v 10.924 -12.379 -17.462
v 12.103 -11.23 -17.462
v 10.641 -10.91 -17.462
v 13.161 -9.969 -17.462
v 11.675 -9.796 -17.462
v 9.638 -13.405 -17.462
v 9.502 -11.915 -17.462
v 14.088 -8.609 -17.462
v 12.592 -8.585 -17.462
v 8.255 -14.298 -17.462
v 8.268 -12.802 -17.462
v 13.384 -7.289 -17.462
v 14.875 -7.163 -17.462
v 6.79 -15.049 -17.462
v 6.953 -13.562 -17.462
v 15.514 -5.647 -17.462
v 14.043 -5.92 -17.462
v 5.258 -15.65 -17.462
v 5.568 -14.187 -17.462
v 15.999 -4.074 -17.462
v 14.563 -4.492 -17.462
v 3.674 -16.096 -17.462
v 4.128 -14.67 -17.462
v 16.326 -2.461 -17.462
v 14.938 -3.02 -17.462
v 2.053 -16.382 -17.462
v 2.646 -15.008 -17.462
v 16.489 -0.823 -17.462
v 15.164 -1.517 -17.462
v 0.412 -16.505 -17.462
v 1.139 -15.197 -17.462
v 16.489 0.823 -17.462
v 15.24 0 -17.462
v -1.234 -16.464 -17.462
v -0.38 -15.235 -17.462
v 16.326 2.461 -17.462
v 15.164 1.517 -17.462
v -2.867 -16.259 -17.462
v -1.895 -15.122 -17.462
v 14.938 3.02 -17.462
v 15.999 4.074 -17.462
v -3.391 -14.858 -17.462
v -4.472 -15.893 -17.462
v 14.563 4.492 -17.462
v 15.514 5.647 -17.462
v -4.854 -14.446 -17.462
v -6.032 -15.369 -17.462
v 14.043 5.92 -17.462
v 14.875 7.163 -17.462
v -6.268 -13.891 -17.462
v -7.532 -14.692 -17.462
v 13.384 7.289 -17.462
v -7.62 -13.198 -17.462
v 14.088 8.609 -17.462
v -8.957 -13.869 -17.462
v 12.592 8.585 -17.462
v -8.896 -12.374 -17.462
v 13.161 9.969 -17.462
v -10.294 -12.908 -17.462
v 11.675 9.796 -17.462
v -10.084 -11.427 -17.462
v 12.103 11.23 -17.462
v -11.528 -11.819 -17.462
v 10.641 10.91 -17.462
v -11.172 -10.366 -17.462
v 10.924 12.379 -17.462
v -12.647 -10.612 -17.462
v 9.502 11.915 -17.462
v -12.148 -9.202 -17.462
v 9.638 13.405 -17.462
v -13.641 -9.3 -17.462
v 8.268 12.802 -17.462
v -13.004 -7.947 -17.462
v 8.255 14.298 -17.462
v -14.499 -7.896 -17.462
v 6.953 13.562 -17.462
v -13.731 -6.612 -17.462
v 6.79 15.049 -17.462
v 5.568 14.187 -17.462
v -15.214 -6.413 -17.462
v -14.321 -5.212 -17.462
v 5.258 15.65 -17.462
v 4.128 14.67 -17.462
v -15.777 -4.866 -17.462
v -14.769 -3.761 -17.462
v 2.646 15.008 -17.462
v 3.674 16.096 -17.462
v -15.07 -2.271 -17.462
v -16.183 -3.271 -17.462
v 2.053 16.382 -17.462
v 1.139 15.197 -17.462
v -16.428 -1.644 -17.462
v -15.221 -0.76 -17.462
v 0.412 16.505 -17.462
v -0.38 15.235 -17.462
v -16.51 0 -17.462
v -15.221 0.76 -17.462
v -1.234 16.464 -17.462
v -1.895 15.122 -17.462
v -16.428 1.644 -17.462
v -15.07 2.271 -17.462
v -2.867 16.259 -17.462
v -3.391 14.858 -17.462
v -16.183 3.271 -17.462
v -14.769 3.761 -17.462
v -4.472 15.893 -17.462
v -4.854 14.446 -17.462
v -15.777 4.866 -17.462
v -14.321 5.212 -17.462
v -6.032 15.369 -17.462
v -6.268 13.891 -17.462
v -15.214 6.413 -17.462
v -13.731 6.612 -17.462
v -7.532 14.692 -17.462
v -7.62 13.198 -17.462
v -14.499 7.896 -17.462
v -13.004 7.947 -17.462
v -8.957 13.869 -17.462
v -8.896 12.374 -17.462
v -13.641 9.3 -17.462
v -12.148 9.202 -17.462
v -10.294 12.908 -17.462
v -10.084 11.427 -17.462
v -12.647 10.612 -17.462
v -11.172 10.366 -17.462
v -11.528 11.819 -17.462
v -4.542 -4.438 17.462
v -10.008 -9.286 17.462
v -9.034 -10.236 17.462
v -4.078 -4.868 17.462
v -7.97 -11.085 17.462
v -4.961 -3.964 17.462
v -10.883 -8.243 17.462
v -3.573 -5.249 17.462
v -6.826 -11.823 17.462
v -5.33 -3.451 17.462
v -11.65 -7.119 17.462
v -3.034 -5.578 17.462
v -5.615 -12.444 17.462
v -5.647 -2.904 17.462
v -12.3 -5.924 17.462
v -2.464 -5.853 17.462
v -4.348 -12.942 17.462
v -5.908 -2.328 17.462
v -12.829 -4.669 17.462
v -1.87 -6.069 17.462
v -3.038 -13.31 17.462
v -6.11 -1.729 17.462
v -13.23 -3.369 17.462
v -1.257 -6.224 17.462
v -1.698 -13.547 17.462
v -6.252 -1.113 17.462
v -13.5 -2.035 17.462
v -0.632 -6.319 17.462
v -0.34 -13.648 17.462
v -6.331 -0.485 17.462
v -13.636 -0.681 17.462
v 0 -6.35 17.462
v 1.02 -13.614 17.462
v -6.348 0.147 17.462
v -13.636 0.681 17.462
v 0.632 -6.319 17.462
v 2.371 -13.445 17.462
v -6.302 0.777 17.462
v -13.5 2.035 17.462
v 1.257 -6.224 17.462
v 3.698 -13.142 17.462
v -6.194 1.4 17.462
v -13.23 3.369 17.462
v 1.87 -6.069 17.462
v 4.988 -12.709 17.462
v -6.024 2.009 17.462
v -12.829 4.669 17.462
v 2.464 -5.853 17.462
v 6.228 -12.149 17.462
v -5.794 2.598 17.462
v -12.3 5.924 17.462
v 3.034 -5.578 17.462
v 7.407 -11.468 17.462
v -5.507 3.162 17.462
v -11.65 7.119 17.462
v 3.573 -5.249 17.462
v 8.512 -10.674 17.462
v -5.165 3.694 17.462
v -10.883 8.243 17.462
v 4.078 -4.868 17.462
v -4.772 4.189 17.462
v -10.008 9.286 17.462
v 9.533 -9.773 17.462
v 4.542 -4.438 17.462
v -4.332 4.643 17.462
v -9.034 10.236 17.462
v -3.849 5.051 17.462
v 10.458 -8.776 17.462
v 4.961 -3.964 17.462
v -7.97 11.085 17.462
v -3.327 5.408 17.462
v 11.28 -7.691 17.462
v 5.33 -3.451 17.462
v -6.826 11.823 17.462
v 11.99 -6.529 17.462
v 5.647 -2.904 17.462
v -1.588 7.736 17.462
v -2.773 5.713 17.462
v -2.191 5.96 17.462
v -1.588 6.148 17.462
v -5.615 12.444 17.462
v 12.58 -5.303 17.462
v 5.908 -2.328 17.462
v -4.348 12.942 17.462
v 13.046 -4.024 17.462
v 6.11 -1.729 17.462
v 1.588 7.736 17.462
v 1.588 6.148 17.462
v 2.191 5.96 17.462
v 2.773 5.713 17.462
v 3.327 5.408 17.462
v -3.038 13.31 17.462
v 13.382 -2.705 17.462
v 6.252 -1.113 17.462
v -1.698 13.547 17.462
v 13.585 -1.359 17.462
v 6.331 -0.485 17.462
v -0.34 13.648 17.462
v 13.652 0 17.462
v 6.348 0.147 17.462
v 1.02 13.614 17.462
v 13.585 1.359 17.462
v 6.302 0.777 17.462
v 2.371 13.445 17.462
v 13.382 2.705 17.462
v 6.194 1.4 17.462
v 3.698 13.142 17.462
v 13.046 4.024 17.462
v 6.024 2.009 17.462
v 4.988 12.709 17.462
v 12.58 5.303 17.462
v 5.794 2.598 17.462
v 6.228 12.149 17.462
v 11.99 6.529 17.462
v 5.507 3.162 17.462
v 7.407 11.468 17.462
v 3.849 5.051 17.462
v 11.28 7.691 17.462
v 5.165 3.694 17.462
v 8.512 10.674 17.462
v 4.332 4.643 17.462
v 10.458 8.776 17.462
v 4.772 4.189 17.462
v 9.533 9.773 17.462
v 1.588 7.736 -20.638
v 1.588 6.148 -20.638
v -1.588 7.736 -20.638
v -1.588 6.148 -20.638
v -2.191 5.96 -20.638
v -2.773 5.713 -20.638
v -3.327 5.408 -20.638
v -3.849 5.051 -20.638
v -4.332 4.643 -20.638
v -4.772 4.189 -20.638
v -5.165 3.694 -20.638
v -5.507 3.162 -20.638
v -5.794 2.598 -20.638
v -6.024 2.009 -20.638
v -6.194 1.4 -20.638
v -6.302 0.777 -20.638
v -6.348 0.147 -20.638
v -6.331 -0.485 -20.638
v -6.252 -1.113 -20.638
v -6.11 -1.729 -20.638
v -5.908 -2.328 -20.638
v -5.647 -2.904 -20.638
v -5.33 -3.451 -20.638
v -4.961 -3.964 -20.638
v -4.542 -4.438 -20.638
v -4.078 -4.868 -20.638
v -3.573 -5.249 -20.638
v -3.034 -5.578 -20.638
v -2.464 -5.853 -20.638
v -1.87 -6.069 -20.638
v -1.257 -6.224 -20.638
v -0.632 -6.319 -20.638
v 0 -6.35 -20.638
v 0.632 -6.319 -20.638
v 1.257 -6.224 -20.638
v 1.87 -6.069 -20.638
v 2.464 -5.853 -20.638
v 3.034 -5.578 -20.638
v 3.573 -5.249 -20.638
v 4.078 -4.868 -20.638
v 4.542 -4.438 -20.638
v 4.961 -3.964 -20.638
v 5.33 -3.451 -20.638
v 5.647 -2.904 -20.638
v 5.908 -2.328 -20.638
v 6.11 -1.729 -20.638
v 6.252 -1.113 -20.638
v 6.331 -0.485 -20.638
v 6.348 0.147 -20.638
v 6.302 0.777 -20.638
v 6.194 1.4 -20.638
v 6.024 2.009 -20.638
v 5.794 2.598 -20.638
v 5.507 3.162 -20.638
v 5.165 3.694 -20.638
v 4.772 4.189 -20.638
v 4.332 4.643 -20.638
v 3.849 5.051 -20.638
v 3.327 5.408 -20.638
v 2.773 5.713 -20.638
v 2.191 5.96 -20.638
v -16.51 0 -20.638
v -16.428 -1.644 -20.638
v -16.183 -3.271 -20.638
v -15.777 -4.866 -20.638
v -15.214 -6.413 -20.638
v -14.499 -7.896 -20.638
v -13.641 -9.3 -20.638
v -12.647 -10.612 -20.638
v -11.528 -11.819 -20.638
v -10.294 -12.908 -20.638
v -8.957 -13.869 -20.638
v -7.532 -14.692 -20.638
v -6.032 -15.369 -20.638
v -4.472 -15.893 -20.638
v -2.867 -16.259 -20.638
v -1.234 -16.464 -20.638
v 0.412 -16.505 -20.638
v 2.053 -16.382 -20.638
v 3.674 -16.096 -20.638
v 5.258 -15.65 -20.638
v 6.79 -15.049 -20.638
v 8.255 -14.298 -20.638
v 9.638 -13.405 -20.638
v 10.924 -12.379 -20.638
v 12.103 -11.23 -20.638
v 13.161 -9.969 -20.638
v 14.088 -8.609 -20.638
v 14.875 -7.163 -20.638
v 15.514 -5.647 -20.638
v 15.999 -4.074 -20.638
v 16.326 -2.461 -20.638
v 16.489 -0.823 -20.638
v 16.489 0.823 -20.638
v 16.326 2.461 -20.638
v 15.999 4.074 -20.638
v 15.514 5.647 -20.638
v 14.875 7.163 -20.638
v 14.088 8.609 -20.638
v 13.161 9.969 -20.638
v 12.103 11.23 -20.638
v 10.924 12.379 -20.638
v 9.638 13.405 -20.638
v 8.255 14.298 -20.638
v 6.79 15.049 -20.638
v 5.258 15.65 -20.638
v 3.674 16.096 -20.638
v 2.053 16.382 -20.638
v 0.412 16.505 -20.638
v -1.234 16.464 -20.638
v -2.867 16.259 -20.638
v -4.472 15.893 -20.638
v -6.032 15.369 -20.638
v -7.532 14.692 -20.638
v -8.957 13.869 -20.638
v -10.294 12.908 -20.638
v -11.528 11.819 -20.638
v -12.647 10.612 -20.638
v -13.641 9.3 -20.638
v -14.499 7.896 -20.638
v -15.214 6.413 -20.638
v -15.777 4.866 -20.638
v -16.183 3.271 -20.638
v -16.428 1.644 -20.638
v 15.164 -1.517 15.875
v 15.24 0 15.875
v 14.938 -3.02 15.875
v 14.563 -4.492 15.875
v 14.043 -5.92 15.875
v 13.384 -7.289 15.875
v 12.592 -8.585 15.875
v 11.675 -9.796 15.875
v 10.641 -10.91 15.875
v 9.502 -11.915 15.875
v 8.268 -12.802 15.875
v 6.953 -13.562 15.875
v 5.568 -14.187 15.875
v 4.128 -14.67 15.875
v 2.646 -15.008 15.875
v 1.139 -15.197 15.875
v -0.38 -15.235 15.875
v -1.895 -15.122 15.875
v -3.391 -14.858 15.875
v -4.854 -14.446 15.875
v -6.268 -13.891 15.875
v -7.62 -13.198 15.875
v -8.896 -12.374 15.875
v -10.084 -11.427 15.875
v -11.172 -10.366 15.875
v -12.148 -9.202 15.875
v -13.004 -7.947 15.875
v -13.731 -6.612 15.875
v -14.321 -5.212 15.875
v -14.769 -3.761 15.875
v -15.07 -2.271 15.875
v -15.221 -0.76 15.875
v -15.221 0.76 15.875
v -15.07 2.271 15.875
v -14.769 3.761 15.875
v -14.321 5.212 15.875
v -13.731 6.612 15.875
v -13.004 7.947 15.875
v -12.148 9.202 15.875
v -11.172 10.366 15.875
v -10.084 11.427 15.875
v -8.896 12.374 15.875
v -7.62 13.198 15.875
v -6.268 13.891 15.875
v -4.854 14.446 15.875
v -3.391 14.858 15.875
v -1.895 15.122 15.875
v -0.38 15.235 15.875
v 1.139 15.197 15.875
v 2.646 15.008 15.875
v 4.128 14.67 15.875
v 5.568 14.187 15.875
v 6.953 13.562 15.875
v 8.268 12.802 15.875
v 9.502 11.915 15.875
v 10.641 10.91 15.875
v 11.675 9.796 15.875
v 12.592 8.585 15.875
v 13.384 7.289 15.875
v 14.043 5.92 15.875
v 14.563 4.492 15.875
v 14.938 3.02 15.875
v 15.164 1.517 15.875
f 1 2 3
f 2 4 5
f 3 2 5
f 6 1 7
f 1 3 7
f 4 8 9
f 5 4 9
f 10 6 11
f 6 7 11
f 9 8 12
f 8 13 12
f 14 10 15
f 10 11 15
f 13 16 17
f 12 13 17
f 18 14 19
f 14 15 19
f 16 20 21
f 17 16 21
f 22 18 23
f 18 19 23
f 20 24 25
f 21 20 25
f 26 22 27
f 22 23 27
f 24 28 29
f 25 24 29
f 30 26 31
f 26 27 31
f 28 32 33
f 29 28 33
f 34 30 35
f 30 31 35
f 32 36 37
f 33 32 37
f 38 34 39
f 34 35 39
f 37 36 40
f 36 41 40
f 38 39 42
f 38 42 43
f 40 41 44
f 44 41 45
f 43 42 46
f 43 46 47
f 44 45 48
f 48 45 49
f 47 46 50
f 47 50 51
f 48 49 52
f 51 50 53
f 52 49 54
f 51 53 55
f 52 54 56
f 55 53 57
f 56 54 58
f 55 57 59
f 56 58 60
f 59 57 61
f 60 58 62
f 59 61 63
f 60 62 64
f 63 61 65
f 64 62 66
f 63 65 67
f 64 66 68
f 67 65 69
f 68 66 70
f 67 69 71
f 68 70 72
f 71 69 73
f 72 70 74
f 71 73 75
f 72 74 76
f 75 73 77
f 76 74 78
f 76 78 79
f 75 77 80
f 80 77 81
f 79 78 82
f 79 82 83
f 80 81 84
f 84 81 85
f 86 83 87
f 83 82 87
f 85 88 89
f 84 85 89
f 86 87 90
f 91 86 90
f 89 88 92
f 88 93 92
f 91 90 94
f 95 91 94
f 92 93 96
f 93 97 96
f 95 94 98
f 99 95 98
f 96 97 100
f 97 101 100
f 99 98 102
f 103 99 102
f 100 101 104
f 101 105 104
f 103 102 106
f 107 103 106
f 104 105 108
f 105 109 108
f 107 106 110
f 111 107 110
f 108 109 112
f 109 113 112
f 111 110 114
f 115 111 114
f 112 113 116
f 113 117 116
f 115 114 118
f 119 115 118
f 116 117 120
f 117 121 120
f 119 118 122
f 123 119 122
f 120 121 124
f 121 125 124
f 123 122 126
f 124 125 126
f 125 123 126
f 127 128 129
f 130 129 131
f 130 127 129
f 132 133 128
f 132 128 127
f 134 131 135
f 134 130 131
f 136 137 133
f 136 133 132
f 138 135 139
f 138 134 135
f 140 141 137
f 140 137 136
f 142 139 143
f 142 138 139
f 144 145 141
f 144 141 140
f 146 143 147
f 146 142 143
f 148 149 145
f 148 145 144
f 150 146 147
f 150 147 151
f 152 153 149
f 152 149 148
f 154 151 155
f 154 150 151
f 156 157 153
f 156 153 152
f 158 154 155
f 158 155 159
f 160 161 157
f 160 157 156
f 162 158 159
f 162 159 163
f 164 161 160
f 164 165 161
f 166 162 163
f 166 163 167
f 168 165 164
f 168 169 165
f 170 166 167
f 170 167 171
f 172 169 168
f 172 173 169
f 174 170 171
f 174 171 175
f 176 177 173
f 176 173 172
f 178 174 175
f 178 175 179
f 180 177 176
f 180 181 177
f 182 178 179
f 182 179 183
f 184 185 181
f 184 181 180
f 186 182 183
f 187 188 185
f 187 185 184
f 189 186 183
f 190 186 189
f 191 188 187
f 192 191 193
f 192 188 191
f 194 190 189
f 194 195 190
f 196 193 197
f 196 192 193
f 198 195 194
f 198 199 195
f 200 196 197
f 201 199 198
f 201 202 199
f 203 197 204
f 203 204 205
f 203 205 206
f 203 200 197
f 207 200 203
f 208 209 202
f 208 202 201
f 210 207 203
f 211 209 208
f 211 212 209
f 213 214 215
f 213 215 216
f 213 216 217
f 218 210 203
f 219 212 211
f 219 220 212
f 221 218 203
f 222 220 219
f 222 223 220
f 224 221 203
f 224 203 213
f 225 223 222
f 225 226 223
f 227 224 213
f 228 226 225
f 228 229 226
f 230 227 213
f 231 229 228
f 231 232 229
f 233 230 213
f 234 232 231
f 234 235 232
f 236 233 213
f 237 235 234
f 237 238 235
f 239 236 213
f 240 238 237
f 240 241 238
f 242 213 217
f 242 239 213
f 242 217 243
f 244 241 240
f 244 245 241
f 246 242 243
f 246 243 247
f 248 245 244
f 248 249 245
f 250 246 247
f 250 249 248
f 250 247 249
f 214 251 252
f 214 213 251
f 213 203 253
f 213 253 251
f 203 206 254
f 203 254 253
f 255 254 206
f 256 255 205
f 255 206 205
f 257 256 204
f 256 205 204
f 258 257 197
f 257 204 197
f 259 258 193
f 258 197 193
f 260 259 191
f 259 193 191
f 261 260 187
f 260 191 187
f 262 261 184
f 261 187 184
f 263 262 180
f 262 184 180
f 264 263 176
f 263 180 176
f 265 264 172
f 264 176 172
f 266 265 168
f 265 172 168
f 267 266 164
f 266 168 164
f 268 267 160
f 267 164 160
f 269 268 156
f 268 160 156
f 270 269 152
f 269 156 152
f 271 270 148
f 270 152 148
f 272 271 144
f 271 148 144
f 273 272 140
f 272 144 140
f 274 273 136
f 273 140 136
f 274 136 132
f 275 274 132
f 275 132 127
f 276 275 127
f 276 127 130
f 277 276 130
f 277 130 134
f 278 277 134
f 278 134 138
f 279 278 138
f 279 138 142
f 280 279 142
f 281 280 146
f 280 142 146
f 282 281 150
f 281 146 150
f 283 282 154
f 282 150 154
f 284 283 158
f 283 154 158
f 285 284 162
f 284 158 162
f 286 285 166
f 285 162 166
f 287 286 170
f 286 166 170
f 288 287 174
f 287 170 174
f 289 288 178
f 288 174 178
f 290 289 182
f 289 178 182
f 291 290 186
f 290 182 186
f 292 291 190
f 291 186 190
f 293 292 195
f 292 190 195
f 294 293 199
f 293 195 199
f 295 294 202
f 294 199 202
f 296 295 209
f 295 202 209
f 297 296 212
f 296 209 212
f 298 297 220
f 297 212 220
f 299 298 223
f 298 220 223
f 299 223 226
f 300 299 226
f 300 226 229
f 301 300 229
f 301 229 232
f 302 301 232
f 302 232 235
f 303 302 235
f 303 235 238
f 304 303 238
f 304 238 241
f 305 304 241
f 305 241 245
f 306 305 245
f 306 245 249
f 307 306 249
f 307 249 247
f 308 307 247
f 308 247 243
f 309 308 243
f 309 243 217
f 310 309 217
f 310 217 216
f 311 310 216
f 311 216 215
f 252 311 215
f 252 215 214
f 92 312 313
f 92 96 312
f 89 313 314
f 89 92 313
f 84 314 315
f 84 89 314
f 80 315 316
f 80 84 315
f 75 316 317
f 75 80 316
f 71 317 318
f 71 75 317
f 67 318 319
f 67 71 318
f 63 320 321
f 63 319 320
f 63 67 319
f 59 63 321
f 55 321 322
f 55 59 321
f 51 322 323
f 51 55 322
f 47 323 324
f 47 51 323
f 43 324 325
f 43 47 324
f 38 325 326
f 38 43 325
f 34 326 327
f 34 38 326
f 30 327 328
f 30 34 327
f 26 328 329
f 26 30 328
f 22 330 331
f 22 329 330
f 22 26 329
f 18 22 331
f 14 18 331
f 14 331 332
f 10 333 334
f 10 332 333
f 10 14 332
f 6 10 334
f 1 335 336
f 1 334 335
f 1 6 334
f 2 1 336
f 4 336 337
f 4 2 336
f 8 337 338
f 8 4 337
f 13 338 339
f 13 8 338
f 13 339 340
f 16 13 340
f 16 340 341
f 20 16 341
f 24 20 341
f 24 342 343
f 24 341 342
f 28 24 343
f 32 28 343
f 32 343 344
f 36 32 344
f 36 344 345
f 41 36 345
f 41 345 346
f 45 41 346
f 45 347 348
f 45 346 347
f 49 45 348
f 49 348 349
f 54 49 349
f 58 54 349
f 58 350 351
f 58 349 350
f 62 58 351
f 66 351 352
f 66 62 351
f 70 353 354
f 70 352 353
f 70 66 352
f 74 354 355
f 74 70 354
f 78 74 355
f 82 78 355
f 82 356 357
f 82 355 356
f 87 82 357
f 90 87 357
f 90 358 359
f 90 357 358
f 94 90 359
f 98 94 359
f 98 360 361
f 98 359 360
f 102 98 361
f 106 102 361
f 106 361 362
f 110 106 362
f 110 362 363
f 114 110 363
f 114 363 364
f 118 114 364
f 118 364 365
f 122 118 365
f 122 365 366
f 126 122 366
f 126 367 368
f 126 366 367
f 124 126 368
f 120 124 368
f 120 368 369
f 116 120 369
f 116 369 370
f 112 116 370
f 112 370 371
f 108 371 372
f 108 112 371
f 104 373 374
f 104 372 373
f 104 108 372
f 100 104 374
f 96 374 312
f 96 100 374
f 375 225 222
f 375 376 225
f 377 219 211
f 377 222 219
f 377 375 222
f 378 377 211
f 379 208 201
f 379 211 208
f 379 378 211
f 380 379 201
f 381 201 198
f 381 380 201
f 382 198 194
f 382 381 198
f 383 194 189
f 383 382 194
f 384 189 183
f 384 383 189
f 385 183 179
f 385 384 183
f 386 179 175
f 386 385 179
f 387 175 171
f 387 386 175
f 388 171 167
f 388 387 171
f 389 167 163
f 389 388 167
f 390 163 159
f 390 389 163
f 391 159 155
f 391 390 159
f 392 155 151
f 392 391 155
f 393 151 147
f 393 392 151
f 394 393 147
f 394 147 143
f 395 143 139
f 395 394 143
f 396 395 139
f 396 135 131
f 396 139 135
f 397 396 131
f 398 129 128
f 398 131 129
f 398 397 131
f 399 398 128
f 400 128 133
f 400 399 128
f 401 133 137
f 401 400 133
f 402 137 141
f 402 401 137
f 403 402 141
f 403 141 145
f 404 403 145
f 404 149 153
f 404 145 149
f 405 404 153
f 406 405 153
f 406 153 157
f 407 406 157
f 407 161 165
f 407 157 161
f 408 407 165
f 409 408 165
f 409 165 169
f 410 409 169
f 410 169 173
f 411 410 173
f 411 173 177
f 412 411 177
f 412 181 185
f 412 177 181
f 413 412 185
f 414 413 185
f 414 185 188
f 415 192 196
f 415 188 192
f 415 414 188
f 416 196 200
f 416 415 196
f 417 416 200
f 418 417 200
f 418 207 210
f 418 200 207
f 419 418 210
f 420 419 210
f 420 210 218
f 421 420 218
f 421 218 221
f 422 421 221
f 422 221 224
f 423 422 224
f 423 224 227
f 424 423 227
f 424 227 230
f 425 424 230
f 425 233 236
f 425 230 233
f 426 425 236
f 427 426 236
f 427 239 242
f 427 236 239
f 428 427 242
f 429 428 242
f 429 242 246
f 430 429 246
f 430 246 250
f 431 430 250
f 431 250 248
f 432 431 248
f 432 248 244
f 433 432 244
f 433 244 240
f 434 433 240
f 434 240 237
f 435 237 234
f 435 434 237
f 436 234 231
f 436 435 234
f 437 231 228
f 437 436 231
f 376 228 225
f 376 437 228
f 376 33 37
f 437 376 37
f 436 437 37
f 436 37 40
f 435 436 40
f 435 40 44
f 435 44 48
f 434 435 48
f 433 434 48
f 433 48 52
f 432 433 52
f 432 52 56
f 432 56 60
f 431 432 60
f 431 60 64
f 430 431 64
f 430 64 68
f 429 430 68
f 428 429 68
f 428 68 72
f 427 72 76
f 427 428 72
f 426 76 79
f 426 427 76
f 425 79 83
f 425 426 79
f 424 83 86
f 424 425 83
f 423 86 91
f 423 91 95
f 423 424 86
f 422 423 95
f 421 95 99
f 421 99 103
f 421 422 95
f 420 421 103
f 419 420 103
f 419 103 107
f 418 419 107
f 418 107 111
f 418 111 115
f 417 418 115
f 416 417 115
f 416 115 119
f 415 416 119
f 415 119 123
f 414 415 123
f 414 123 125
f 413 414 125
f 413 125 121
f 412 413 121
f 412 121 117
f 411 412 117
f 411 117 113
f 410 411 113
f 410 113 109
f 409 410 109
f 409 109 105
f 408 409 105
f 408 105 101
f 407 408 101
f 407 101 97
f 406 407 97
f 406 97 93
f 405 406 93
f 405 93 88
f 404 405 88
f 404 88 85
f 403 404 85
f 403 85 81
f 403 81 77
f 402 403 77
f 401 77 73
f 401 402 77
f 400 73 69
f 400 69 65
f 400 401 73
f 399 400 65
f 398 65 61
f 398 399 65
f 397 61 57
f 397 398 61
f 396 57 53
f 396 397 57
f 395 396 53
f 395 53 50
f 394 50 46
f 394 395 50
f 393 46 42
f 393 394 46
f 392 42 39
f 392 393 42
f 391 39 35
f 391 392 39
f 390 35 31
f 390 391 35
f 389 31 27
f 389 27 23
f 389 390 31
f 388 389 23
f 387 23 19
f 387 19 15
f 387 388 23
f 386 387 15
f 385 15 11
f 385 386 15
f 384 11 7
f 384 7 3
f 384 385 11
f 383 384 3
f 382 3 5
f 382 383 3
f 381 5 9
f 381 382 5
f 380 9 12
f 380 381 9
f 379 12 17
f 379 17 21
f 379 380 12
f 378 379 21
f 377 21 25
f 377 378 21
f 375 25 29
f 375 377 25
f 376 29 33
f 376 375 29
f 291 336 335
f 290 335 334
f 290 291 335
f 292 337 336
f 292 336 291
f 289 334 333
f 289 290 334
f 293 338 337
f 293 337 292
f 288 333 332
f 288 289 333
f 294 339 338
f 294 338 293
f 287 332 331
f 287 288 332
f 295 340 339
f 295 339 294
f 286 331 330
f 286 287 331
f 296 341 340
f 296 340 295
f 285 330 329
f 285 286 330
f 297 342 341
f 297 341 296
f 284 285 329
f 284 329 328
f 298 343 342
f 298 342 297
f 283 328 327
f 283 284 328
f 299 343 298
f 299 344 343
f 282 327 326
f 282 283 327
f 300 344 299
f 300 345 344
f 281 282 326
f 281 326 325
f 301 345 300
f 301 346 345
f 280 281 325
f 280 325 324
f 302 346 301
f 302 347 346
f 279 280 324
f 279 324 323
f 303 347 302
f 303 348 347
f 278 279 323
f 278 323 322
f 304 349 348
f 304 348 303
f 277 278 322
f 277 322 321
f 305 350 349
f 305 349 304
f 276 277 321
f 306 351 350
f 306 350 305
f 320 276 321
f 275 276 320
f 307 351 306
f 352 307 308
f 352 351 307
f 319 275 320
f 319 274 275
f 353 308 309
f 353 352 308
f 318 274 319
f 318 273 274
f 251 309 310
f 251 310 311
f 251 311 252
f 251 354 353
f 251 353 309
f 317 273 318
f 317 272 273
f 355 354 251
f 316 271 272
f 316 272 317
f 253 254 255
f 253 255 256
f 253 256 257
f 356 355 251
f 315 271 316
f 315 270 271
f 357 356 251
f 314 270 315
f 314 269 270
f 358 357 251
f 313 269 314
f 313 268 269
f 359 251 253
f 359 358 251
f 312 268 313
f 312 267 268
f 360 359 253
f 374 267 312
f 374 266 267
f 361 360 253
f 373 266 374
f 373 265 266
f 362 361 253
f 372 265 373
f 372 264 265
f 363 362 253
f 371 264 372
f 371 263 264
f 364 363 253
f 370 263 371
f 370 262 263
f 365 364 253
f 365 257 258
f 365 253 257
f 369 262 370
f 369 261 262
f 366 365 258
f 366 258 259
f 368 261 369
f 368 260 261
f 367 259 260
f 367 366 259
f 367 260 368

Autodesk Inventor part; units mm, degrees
ref_plane "YZ Plane" through (0, 0, 0) normal (1, 0, 0) x (0, 1, 0)
ref_plane "XZ Plane" through (0, 0, 0) normal (0, 1, 0) x (-1, 0, 0)
ref_plane "XY Plane" through (0, 0, 0) normal (0, 0, 1) x (1, 0, 0)
sketch "Sketch1" plane through (0, 0, 0) normal (0, 0, 1) x (1, 0, 0)
  circle A0 centre (0, 0) radius 15.24
  dimension "d0" = 30.48
extrude "Extrusion1" add sketch "Sketch1" along normal mid plane 34.925
sketch "Sketch2" plane through (0, 0, -17.4625) normal (0, 0, -1) x (-1, 0, 0)
  circle A0 centre (0, 0) radius 15.24 construction
  circle A1 centre (0, 0) radius 16.51
  dimension "d5" = 33.02
extrude "Extrusion2" add sketch "Sketch2" along normal blind 3.175
sketch "Sketch3" plane through (0, 0, 17.4625) normal (0, 0, 1) x (1, 0, 0)
  circle A0 centre (0, 0) radius 15.24 construction
  circle A1 centre (0, 0) radius 6.35
  line L0 (-1.5875, 7.7359) -> (1.5875, 7.7359)
  line L1 (1.5875, 7.7359) -> (1.5875, 4.5609)
  line L2 (1.5875, 4.5609) -> (-1.5875, 4.5609)
  line L3 (-1.5875, 4.5609) -> (-1.5875, 7.7359)
  point P0 (0, 7.7359)
  point P1 (-1.5875, 6.1484)
  dimension "d8" = 12.7
  dimension "d9" = 3.175
  dimension "d10" = 3.175
extrude "Extrusion3" cut sketch "Sketch3" against normal through all
chamfer "Chamfer1" distance 1.5875 angle 45 1 edges at (-15.24, 0, 17.4625)
properties part number "LM Colson Hub 500 key" material "Aluminum 6061"
